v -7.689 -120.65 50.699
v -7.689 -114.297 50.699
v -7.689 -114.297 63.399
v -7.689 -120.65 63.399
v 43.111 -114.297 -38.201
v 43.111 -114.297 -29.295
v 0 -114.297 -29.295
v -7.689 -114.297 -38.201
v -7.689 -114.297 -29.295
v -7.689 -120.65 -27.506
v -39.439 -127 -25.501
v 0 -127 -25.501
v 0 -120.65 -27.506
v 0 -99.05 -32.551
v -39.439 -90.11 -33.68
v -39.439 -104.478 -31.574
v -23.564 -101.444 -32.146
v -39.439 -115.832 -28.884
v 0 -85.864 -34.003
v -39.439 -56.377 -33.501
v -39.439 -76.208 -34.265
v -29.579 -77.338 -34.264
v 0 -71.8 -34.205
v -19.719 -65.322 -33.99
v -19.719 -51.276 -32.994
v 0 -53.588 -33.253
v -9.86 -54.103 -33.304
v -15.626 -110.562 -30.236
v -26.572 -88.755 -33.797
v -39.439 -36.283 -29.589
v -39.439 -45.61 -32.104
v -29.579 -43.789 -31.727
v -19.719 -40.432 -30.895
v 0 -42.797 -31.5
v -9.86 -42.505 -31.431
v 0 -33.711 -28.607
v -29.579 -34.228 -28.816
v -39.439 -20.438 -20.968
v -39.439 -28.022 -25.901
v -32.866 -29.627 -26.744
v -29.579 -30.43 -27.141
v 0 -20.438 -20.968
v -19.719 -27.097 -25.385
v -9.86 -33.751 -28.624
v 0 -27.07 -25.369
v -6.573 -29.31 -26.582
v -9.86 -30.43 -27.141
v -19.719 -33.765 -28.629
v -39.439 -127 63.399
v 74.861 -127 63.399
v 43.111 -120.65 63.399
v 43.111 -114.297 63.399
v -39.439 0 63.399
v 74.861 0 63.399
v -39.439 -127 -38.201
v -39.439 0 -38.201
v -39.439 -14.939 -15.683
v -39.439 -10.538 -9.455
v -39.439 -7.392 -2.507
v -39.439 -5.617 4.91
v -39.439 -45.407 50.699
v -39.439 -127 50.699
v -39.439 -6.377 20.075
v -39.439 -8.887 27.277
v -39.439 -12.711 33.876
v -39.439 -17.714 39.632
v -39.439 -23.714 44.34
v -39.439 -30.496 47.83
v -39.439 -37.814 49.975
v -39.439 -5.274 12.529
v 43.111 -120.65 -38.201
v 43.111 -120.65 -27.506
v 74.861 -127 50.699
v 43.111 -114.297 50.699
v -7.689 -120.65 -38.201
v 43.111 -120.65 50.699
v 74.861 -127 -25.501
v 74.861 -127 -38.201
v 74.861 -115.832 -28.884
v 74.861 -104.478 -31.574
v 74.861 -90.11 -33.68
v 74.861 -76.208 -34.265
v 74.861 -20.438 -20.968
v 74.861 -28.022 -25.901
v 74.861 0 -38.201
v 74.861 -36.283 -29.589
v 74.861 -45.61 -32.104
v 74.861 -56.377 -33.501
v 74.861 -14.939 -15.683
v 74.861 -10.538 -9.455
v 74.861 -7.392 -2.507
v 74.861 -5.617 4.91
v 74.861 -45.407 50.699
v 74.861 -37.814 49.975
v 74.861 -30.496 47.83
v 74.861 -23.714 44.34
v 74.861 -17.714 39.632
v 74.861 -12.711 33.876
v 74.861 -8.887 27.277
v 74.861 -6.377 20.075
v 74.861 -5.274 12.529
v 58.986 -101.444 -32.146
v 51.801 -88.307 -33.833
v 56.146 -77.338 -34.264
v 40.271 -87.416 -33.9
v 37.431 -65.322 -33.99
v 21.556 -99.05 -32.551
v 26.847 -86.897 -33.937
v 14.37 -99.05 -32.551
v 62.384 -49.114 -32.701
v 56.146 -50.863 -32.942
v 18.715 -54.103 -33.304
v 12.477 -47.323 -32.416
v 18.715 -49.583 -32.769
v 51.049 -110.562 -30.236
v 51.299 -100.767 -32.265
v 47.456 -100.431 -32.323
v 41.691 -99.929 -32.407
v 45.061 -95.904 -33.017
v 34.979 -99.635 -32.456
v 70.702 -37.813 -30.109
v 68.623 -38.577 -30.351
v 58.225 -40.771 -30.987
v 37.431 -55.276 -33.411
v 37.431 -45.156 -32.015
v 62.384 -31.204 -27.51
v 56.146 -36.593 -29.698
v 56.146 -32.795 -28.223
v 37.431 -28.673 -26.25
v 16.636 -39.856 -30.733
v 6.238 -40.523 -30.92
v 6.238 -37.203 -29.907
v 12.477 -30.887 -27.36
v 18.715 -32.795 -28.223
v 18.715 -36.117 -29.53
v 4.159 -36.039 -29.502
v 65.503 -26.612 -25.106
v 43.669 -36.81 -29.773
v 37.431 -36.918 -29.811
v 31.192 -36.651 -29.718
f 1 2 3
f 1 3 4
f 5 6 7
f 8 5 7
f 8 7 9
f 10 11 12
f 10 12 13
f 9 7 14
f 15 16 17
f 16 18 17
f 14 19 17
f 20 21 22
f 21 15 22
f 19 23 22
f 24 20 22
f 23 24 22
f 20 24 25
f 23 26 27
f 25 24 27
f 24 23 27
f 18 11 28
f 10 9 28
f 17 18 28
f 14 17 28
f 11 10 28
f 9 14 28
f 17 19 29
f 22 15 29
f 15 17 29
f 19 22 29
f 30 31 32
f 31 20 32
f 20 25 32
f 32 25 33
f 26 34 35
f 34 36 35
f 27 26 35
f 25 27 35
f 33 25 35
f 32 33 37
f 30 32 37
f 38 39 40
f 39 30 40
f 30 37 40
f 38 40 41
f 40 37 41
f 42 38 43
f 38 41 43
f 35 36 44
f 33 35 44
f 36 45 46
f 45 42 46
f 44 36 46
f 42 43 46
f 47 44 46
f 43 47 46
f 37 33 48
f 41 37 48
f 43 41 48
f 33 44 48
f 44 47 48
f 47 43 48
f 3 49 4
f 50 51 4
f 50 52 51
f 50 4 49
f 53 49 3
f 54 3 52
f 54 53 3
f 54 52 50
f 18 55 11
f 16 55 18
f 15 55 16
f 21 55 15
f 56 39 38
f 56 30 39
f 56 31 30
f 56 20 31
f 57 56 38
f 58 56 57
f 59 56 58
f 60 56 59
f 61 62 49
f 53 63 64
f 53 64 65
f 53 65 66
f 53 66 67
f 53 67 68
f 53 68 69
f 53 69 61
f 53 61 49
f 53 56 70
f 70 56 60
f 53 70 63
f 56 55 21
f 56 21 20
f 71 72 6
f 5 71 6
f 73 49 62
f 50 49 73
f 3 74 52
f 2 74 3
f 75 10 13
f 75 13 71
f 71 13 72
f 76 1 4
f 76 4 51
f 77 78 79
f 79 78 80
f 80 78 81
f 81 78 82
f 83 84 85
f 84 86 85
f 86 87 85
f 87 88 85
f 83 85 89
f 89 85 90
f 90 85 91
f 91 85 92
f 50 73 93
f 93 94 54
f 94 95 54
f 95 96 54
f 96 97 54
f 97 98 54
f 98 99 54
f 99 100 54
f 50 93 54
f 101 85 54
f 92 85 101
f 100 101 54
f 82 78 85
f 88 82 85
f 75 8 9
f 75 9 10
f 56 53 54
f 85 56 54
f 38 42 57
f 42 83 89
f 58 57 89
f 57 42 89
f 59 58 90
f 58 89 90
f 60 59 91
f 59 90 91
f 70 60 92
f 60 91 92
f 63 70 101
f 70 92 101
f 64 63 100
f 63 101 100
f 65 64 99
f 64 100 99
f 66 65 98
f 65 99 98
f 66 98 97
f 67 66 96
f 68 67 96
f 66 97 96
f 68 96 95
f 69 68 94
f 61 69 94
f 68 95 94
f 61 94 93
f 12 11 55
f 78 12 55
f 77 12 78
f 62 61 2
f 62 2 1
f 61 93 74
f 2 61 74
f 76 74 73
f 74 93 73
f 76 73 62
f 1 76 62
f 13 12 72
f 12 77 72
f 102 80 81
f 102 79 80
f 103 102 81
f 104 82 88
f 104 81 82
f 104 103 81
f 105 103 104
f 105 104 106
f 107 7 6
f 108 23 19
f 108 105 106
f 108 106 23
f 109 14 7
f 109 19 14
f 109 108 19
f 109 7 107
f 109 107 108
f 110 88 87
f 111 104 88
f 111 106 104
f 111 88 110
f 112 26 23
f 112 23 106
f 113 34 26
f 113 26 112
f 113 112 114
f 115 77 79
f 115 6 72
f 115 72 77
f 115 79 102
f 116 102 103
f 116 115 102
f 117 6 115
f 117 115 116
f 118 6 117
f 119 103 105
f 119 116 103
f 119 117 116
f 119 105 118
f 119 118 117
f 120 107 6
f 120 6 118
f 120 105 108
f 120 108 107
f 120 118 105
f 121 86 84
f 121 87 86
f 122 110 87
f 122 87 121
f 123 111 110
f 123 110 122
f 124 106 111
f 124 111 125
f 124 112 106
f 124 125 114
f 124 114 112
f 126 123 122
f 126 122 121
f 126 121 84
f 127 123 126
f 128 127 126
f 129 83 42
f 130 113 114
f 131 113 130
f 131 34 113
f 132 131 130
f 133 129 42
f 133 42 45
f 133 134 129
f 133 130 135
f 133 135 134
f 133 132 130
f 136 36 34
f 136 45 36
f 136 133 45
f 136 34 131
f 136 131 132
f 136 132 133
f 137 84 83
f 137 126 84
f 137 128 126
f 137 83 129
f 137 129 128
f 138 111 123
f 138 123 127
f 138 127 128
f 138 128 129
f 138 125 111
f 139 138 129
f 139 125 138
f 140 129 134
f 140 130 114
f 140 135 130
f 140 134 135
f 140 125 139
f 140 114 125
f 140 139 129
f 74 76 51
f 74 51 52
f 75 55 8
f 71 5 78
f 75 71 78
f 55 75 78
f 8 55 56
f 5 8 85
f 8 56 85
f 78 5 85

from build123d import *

# Parameters (mm, degrees)
F0_W          = 114.3
F0_H          = 101.6
F1_DEPTH      = 127
F3_DEPTH      = 39.4399856607
F3_DEPTH_BACK = 74.8620143393
F4_W          = 78.9322577574
F4_H          = 9.7147444349
F5_DEPTH      = 38.2024062272
F5_DEPTH_BACK = 63.3995939728


with BuildPart() as f1:
    # F0 (on Front) → F1 (new body)
    with BuildSketch(Plane.XZ):
        with Locations((17.7110143393, 12.5985938728)):
            Rectangle(F0_W, F0_H)
    extrude(amount=F1_DEPTH)

    # F2 (on Right) → F3 (cut, two sides)
    with BuildSketch(Plane.YZ) as f3_sk:
        with BuildLine():
            Line((-127, 50.6985938728), (-127, -25.5014061272))
            add(Edge.make_bspline(
                [(-127, -25.5014061272), (-98.9603772759, -34.7956232727), (-68.005550577, -34.5681270065), (-35.421602428, -32.3844701052), (-20.4378271917, -20.9679826113)],
                knots=[0, 0, 0, 0, 0.5357898792, 1, 1, 1, 1], degree=3))
            ThreePointArc((-20.4378271917, -20.9679826113), (-7.4607172084, 23.7360933268), (-45.4065121441, 50.6985938728))
            Line((-45.4065121441, 50.6985938728), (-127, 50.6985938728))
        make_face()
    extrude(amount=-F3_DEPTH, mode=Mode.SUBTRACT)
    extrude(f3_sk.sketch, amount=F3_DEPTH_BACK, mode=Mode.SUBTRACT)

    # F4 (on Top) → F5 (cut, two sides)
    with BuildSketch(Plane.XY) as f5_sk:
        with Locations((19.8757408652, -184.373836463)):
            Rectangle(F4_W, F4_H)
        Polygon((17.7110143393, -114.29746), (-7.6889856607, -114.29746), (-7.6889856607, -120.65), (17.7110143393, -120.65), (43.1110143393, -120.65), (43.1110143393, -114.29746), align=None)
    extrude(amount=-F5_DEPTH, mode=Mode.SUBTRACT)
    extrude(f5_sk.sketch, amount=F5_DEPTH_BACK, mode=Mode.SUBTRACT)


solid = f1.part
